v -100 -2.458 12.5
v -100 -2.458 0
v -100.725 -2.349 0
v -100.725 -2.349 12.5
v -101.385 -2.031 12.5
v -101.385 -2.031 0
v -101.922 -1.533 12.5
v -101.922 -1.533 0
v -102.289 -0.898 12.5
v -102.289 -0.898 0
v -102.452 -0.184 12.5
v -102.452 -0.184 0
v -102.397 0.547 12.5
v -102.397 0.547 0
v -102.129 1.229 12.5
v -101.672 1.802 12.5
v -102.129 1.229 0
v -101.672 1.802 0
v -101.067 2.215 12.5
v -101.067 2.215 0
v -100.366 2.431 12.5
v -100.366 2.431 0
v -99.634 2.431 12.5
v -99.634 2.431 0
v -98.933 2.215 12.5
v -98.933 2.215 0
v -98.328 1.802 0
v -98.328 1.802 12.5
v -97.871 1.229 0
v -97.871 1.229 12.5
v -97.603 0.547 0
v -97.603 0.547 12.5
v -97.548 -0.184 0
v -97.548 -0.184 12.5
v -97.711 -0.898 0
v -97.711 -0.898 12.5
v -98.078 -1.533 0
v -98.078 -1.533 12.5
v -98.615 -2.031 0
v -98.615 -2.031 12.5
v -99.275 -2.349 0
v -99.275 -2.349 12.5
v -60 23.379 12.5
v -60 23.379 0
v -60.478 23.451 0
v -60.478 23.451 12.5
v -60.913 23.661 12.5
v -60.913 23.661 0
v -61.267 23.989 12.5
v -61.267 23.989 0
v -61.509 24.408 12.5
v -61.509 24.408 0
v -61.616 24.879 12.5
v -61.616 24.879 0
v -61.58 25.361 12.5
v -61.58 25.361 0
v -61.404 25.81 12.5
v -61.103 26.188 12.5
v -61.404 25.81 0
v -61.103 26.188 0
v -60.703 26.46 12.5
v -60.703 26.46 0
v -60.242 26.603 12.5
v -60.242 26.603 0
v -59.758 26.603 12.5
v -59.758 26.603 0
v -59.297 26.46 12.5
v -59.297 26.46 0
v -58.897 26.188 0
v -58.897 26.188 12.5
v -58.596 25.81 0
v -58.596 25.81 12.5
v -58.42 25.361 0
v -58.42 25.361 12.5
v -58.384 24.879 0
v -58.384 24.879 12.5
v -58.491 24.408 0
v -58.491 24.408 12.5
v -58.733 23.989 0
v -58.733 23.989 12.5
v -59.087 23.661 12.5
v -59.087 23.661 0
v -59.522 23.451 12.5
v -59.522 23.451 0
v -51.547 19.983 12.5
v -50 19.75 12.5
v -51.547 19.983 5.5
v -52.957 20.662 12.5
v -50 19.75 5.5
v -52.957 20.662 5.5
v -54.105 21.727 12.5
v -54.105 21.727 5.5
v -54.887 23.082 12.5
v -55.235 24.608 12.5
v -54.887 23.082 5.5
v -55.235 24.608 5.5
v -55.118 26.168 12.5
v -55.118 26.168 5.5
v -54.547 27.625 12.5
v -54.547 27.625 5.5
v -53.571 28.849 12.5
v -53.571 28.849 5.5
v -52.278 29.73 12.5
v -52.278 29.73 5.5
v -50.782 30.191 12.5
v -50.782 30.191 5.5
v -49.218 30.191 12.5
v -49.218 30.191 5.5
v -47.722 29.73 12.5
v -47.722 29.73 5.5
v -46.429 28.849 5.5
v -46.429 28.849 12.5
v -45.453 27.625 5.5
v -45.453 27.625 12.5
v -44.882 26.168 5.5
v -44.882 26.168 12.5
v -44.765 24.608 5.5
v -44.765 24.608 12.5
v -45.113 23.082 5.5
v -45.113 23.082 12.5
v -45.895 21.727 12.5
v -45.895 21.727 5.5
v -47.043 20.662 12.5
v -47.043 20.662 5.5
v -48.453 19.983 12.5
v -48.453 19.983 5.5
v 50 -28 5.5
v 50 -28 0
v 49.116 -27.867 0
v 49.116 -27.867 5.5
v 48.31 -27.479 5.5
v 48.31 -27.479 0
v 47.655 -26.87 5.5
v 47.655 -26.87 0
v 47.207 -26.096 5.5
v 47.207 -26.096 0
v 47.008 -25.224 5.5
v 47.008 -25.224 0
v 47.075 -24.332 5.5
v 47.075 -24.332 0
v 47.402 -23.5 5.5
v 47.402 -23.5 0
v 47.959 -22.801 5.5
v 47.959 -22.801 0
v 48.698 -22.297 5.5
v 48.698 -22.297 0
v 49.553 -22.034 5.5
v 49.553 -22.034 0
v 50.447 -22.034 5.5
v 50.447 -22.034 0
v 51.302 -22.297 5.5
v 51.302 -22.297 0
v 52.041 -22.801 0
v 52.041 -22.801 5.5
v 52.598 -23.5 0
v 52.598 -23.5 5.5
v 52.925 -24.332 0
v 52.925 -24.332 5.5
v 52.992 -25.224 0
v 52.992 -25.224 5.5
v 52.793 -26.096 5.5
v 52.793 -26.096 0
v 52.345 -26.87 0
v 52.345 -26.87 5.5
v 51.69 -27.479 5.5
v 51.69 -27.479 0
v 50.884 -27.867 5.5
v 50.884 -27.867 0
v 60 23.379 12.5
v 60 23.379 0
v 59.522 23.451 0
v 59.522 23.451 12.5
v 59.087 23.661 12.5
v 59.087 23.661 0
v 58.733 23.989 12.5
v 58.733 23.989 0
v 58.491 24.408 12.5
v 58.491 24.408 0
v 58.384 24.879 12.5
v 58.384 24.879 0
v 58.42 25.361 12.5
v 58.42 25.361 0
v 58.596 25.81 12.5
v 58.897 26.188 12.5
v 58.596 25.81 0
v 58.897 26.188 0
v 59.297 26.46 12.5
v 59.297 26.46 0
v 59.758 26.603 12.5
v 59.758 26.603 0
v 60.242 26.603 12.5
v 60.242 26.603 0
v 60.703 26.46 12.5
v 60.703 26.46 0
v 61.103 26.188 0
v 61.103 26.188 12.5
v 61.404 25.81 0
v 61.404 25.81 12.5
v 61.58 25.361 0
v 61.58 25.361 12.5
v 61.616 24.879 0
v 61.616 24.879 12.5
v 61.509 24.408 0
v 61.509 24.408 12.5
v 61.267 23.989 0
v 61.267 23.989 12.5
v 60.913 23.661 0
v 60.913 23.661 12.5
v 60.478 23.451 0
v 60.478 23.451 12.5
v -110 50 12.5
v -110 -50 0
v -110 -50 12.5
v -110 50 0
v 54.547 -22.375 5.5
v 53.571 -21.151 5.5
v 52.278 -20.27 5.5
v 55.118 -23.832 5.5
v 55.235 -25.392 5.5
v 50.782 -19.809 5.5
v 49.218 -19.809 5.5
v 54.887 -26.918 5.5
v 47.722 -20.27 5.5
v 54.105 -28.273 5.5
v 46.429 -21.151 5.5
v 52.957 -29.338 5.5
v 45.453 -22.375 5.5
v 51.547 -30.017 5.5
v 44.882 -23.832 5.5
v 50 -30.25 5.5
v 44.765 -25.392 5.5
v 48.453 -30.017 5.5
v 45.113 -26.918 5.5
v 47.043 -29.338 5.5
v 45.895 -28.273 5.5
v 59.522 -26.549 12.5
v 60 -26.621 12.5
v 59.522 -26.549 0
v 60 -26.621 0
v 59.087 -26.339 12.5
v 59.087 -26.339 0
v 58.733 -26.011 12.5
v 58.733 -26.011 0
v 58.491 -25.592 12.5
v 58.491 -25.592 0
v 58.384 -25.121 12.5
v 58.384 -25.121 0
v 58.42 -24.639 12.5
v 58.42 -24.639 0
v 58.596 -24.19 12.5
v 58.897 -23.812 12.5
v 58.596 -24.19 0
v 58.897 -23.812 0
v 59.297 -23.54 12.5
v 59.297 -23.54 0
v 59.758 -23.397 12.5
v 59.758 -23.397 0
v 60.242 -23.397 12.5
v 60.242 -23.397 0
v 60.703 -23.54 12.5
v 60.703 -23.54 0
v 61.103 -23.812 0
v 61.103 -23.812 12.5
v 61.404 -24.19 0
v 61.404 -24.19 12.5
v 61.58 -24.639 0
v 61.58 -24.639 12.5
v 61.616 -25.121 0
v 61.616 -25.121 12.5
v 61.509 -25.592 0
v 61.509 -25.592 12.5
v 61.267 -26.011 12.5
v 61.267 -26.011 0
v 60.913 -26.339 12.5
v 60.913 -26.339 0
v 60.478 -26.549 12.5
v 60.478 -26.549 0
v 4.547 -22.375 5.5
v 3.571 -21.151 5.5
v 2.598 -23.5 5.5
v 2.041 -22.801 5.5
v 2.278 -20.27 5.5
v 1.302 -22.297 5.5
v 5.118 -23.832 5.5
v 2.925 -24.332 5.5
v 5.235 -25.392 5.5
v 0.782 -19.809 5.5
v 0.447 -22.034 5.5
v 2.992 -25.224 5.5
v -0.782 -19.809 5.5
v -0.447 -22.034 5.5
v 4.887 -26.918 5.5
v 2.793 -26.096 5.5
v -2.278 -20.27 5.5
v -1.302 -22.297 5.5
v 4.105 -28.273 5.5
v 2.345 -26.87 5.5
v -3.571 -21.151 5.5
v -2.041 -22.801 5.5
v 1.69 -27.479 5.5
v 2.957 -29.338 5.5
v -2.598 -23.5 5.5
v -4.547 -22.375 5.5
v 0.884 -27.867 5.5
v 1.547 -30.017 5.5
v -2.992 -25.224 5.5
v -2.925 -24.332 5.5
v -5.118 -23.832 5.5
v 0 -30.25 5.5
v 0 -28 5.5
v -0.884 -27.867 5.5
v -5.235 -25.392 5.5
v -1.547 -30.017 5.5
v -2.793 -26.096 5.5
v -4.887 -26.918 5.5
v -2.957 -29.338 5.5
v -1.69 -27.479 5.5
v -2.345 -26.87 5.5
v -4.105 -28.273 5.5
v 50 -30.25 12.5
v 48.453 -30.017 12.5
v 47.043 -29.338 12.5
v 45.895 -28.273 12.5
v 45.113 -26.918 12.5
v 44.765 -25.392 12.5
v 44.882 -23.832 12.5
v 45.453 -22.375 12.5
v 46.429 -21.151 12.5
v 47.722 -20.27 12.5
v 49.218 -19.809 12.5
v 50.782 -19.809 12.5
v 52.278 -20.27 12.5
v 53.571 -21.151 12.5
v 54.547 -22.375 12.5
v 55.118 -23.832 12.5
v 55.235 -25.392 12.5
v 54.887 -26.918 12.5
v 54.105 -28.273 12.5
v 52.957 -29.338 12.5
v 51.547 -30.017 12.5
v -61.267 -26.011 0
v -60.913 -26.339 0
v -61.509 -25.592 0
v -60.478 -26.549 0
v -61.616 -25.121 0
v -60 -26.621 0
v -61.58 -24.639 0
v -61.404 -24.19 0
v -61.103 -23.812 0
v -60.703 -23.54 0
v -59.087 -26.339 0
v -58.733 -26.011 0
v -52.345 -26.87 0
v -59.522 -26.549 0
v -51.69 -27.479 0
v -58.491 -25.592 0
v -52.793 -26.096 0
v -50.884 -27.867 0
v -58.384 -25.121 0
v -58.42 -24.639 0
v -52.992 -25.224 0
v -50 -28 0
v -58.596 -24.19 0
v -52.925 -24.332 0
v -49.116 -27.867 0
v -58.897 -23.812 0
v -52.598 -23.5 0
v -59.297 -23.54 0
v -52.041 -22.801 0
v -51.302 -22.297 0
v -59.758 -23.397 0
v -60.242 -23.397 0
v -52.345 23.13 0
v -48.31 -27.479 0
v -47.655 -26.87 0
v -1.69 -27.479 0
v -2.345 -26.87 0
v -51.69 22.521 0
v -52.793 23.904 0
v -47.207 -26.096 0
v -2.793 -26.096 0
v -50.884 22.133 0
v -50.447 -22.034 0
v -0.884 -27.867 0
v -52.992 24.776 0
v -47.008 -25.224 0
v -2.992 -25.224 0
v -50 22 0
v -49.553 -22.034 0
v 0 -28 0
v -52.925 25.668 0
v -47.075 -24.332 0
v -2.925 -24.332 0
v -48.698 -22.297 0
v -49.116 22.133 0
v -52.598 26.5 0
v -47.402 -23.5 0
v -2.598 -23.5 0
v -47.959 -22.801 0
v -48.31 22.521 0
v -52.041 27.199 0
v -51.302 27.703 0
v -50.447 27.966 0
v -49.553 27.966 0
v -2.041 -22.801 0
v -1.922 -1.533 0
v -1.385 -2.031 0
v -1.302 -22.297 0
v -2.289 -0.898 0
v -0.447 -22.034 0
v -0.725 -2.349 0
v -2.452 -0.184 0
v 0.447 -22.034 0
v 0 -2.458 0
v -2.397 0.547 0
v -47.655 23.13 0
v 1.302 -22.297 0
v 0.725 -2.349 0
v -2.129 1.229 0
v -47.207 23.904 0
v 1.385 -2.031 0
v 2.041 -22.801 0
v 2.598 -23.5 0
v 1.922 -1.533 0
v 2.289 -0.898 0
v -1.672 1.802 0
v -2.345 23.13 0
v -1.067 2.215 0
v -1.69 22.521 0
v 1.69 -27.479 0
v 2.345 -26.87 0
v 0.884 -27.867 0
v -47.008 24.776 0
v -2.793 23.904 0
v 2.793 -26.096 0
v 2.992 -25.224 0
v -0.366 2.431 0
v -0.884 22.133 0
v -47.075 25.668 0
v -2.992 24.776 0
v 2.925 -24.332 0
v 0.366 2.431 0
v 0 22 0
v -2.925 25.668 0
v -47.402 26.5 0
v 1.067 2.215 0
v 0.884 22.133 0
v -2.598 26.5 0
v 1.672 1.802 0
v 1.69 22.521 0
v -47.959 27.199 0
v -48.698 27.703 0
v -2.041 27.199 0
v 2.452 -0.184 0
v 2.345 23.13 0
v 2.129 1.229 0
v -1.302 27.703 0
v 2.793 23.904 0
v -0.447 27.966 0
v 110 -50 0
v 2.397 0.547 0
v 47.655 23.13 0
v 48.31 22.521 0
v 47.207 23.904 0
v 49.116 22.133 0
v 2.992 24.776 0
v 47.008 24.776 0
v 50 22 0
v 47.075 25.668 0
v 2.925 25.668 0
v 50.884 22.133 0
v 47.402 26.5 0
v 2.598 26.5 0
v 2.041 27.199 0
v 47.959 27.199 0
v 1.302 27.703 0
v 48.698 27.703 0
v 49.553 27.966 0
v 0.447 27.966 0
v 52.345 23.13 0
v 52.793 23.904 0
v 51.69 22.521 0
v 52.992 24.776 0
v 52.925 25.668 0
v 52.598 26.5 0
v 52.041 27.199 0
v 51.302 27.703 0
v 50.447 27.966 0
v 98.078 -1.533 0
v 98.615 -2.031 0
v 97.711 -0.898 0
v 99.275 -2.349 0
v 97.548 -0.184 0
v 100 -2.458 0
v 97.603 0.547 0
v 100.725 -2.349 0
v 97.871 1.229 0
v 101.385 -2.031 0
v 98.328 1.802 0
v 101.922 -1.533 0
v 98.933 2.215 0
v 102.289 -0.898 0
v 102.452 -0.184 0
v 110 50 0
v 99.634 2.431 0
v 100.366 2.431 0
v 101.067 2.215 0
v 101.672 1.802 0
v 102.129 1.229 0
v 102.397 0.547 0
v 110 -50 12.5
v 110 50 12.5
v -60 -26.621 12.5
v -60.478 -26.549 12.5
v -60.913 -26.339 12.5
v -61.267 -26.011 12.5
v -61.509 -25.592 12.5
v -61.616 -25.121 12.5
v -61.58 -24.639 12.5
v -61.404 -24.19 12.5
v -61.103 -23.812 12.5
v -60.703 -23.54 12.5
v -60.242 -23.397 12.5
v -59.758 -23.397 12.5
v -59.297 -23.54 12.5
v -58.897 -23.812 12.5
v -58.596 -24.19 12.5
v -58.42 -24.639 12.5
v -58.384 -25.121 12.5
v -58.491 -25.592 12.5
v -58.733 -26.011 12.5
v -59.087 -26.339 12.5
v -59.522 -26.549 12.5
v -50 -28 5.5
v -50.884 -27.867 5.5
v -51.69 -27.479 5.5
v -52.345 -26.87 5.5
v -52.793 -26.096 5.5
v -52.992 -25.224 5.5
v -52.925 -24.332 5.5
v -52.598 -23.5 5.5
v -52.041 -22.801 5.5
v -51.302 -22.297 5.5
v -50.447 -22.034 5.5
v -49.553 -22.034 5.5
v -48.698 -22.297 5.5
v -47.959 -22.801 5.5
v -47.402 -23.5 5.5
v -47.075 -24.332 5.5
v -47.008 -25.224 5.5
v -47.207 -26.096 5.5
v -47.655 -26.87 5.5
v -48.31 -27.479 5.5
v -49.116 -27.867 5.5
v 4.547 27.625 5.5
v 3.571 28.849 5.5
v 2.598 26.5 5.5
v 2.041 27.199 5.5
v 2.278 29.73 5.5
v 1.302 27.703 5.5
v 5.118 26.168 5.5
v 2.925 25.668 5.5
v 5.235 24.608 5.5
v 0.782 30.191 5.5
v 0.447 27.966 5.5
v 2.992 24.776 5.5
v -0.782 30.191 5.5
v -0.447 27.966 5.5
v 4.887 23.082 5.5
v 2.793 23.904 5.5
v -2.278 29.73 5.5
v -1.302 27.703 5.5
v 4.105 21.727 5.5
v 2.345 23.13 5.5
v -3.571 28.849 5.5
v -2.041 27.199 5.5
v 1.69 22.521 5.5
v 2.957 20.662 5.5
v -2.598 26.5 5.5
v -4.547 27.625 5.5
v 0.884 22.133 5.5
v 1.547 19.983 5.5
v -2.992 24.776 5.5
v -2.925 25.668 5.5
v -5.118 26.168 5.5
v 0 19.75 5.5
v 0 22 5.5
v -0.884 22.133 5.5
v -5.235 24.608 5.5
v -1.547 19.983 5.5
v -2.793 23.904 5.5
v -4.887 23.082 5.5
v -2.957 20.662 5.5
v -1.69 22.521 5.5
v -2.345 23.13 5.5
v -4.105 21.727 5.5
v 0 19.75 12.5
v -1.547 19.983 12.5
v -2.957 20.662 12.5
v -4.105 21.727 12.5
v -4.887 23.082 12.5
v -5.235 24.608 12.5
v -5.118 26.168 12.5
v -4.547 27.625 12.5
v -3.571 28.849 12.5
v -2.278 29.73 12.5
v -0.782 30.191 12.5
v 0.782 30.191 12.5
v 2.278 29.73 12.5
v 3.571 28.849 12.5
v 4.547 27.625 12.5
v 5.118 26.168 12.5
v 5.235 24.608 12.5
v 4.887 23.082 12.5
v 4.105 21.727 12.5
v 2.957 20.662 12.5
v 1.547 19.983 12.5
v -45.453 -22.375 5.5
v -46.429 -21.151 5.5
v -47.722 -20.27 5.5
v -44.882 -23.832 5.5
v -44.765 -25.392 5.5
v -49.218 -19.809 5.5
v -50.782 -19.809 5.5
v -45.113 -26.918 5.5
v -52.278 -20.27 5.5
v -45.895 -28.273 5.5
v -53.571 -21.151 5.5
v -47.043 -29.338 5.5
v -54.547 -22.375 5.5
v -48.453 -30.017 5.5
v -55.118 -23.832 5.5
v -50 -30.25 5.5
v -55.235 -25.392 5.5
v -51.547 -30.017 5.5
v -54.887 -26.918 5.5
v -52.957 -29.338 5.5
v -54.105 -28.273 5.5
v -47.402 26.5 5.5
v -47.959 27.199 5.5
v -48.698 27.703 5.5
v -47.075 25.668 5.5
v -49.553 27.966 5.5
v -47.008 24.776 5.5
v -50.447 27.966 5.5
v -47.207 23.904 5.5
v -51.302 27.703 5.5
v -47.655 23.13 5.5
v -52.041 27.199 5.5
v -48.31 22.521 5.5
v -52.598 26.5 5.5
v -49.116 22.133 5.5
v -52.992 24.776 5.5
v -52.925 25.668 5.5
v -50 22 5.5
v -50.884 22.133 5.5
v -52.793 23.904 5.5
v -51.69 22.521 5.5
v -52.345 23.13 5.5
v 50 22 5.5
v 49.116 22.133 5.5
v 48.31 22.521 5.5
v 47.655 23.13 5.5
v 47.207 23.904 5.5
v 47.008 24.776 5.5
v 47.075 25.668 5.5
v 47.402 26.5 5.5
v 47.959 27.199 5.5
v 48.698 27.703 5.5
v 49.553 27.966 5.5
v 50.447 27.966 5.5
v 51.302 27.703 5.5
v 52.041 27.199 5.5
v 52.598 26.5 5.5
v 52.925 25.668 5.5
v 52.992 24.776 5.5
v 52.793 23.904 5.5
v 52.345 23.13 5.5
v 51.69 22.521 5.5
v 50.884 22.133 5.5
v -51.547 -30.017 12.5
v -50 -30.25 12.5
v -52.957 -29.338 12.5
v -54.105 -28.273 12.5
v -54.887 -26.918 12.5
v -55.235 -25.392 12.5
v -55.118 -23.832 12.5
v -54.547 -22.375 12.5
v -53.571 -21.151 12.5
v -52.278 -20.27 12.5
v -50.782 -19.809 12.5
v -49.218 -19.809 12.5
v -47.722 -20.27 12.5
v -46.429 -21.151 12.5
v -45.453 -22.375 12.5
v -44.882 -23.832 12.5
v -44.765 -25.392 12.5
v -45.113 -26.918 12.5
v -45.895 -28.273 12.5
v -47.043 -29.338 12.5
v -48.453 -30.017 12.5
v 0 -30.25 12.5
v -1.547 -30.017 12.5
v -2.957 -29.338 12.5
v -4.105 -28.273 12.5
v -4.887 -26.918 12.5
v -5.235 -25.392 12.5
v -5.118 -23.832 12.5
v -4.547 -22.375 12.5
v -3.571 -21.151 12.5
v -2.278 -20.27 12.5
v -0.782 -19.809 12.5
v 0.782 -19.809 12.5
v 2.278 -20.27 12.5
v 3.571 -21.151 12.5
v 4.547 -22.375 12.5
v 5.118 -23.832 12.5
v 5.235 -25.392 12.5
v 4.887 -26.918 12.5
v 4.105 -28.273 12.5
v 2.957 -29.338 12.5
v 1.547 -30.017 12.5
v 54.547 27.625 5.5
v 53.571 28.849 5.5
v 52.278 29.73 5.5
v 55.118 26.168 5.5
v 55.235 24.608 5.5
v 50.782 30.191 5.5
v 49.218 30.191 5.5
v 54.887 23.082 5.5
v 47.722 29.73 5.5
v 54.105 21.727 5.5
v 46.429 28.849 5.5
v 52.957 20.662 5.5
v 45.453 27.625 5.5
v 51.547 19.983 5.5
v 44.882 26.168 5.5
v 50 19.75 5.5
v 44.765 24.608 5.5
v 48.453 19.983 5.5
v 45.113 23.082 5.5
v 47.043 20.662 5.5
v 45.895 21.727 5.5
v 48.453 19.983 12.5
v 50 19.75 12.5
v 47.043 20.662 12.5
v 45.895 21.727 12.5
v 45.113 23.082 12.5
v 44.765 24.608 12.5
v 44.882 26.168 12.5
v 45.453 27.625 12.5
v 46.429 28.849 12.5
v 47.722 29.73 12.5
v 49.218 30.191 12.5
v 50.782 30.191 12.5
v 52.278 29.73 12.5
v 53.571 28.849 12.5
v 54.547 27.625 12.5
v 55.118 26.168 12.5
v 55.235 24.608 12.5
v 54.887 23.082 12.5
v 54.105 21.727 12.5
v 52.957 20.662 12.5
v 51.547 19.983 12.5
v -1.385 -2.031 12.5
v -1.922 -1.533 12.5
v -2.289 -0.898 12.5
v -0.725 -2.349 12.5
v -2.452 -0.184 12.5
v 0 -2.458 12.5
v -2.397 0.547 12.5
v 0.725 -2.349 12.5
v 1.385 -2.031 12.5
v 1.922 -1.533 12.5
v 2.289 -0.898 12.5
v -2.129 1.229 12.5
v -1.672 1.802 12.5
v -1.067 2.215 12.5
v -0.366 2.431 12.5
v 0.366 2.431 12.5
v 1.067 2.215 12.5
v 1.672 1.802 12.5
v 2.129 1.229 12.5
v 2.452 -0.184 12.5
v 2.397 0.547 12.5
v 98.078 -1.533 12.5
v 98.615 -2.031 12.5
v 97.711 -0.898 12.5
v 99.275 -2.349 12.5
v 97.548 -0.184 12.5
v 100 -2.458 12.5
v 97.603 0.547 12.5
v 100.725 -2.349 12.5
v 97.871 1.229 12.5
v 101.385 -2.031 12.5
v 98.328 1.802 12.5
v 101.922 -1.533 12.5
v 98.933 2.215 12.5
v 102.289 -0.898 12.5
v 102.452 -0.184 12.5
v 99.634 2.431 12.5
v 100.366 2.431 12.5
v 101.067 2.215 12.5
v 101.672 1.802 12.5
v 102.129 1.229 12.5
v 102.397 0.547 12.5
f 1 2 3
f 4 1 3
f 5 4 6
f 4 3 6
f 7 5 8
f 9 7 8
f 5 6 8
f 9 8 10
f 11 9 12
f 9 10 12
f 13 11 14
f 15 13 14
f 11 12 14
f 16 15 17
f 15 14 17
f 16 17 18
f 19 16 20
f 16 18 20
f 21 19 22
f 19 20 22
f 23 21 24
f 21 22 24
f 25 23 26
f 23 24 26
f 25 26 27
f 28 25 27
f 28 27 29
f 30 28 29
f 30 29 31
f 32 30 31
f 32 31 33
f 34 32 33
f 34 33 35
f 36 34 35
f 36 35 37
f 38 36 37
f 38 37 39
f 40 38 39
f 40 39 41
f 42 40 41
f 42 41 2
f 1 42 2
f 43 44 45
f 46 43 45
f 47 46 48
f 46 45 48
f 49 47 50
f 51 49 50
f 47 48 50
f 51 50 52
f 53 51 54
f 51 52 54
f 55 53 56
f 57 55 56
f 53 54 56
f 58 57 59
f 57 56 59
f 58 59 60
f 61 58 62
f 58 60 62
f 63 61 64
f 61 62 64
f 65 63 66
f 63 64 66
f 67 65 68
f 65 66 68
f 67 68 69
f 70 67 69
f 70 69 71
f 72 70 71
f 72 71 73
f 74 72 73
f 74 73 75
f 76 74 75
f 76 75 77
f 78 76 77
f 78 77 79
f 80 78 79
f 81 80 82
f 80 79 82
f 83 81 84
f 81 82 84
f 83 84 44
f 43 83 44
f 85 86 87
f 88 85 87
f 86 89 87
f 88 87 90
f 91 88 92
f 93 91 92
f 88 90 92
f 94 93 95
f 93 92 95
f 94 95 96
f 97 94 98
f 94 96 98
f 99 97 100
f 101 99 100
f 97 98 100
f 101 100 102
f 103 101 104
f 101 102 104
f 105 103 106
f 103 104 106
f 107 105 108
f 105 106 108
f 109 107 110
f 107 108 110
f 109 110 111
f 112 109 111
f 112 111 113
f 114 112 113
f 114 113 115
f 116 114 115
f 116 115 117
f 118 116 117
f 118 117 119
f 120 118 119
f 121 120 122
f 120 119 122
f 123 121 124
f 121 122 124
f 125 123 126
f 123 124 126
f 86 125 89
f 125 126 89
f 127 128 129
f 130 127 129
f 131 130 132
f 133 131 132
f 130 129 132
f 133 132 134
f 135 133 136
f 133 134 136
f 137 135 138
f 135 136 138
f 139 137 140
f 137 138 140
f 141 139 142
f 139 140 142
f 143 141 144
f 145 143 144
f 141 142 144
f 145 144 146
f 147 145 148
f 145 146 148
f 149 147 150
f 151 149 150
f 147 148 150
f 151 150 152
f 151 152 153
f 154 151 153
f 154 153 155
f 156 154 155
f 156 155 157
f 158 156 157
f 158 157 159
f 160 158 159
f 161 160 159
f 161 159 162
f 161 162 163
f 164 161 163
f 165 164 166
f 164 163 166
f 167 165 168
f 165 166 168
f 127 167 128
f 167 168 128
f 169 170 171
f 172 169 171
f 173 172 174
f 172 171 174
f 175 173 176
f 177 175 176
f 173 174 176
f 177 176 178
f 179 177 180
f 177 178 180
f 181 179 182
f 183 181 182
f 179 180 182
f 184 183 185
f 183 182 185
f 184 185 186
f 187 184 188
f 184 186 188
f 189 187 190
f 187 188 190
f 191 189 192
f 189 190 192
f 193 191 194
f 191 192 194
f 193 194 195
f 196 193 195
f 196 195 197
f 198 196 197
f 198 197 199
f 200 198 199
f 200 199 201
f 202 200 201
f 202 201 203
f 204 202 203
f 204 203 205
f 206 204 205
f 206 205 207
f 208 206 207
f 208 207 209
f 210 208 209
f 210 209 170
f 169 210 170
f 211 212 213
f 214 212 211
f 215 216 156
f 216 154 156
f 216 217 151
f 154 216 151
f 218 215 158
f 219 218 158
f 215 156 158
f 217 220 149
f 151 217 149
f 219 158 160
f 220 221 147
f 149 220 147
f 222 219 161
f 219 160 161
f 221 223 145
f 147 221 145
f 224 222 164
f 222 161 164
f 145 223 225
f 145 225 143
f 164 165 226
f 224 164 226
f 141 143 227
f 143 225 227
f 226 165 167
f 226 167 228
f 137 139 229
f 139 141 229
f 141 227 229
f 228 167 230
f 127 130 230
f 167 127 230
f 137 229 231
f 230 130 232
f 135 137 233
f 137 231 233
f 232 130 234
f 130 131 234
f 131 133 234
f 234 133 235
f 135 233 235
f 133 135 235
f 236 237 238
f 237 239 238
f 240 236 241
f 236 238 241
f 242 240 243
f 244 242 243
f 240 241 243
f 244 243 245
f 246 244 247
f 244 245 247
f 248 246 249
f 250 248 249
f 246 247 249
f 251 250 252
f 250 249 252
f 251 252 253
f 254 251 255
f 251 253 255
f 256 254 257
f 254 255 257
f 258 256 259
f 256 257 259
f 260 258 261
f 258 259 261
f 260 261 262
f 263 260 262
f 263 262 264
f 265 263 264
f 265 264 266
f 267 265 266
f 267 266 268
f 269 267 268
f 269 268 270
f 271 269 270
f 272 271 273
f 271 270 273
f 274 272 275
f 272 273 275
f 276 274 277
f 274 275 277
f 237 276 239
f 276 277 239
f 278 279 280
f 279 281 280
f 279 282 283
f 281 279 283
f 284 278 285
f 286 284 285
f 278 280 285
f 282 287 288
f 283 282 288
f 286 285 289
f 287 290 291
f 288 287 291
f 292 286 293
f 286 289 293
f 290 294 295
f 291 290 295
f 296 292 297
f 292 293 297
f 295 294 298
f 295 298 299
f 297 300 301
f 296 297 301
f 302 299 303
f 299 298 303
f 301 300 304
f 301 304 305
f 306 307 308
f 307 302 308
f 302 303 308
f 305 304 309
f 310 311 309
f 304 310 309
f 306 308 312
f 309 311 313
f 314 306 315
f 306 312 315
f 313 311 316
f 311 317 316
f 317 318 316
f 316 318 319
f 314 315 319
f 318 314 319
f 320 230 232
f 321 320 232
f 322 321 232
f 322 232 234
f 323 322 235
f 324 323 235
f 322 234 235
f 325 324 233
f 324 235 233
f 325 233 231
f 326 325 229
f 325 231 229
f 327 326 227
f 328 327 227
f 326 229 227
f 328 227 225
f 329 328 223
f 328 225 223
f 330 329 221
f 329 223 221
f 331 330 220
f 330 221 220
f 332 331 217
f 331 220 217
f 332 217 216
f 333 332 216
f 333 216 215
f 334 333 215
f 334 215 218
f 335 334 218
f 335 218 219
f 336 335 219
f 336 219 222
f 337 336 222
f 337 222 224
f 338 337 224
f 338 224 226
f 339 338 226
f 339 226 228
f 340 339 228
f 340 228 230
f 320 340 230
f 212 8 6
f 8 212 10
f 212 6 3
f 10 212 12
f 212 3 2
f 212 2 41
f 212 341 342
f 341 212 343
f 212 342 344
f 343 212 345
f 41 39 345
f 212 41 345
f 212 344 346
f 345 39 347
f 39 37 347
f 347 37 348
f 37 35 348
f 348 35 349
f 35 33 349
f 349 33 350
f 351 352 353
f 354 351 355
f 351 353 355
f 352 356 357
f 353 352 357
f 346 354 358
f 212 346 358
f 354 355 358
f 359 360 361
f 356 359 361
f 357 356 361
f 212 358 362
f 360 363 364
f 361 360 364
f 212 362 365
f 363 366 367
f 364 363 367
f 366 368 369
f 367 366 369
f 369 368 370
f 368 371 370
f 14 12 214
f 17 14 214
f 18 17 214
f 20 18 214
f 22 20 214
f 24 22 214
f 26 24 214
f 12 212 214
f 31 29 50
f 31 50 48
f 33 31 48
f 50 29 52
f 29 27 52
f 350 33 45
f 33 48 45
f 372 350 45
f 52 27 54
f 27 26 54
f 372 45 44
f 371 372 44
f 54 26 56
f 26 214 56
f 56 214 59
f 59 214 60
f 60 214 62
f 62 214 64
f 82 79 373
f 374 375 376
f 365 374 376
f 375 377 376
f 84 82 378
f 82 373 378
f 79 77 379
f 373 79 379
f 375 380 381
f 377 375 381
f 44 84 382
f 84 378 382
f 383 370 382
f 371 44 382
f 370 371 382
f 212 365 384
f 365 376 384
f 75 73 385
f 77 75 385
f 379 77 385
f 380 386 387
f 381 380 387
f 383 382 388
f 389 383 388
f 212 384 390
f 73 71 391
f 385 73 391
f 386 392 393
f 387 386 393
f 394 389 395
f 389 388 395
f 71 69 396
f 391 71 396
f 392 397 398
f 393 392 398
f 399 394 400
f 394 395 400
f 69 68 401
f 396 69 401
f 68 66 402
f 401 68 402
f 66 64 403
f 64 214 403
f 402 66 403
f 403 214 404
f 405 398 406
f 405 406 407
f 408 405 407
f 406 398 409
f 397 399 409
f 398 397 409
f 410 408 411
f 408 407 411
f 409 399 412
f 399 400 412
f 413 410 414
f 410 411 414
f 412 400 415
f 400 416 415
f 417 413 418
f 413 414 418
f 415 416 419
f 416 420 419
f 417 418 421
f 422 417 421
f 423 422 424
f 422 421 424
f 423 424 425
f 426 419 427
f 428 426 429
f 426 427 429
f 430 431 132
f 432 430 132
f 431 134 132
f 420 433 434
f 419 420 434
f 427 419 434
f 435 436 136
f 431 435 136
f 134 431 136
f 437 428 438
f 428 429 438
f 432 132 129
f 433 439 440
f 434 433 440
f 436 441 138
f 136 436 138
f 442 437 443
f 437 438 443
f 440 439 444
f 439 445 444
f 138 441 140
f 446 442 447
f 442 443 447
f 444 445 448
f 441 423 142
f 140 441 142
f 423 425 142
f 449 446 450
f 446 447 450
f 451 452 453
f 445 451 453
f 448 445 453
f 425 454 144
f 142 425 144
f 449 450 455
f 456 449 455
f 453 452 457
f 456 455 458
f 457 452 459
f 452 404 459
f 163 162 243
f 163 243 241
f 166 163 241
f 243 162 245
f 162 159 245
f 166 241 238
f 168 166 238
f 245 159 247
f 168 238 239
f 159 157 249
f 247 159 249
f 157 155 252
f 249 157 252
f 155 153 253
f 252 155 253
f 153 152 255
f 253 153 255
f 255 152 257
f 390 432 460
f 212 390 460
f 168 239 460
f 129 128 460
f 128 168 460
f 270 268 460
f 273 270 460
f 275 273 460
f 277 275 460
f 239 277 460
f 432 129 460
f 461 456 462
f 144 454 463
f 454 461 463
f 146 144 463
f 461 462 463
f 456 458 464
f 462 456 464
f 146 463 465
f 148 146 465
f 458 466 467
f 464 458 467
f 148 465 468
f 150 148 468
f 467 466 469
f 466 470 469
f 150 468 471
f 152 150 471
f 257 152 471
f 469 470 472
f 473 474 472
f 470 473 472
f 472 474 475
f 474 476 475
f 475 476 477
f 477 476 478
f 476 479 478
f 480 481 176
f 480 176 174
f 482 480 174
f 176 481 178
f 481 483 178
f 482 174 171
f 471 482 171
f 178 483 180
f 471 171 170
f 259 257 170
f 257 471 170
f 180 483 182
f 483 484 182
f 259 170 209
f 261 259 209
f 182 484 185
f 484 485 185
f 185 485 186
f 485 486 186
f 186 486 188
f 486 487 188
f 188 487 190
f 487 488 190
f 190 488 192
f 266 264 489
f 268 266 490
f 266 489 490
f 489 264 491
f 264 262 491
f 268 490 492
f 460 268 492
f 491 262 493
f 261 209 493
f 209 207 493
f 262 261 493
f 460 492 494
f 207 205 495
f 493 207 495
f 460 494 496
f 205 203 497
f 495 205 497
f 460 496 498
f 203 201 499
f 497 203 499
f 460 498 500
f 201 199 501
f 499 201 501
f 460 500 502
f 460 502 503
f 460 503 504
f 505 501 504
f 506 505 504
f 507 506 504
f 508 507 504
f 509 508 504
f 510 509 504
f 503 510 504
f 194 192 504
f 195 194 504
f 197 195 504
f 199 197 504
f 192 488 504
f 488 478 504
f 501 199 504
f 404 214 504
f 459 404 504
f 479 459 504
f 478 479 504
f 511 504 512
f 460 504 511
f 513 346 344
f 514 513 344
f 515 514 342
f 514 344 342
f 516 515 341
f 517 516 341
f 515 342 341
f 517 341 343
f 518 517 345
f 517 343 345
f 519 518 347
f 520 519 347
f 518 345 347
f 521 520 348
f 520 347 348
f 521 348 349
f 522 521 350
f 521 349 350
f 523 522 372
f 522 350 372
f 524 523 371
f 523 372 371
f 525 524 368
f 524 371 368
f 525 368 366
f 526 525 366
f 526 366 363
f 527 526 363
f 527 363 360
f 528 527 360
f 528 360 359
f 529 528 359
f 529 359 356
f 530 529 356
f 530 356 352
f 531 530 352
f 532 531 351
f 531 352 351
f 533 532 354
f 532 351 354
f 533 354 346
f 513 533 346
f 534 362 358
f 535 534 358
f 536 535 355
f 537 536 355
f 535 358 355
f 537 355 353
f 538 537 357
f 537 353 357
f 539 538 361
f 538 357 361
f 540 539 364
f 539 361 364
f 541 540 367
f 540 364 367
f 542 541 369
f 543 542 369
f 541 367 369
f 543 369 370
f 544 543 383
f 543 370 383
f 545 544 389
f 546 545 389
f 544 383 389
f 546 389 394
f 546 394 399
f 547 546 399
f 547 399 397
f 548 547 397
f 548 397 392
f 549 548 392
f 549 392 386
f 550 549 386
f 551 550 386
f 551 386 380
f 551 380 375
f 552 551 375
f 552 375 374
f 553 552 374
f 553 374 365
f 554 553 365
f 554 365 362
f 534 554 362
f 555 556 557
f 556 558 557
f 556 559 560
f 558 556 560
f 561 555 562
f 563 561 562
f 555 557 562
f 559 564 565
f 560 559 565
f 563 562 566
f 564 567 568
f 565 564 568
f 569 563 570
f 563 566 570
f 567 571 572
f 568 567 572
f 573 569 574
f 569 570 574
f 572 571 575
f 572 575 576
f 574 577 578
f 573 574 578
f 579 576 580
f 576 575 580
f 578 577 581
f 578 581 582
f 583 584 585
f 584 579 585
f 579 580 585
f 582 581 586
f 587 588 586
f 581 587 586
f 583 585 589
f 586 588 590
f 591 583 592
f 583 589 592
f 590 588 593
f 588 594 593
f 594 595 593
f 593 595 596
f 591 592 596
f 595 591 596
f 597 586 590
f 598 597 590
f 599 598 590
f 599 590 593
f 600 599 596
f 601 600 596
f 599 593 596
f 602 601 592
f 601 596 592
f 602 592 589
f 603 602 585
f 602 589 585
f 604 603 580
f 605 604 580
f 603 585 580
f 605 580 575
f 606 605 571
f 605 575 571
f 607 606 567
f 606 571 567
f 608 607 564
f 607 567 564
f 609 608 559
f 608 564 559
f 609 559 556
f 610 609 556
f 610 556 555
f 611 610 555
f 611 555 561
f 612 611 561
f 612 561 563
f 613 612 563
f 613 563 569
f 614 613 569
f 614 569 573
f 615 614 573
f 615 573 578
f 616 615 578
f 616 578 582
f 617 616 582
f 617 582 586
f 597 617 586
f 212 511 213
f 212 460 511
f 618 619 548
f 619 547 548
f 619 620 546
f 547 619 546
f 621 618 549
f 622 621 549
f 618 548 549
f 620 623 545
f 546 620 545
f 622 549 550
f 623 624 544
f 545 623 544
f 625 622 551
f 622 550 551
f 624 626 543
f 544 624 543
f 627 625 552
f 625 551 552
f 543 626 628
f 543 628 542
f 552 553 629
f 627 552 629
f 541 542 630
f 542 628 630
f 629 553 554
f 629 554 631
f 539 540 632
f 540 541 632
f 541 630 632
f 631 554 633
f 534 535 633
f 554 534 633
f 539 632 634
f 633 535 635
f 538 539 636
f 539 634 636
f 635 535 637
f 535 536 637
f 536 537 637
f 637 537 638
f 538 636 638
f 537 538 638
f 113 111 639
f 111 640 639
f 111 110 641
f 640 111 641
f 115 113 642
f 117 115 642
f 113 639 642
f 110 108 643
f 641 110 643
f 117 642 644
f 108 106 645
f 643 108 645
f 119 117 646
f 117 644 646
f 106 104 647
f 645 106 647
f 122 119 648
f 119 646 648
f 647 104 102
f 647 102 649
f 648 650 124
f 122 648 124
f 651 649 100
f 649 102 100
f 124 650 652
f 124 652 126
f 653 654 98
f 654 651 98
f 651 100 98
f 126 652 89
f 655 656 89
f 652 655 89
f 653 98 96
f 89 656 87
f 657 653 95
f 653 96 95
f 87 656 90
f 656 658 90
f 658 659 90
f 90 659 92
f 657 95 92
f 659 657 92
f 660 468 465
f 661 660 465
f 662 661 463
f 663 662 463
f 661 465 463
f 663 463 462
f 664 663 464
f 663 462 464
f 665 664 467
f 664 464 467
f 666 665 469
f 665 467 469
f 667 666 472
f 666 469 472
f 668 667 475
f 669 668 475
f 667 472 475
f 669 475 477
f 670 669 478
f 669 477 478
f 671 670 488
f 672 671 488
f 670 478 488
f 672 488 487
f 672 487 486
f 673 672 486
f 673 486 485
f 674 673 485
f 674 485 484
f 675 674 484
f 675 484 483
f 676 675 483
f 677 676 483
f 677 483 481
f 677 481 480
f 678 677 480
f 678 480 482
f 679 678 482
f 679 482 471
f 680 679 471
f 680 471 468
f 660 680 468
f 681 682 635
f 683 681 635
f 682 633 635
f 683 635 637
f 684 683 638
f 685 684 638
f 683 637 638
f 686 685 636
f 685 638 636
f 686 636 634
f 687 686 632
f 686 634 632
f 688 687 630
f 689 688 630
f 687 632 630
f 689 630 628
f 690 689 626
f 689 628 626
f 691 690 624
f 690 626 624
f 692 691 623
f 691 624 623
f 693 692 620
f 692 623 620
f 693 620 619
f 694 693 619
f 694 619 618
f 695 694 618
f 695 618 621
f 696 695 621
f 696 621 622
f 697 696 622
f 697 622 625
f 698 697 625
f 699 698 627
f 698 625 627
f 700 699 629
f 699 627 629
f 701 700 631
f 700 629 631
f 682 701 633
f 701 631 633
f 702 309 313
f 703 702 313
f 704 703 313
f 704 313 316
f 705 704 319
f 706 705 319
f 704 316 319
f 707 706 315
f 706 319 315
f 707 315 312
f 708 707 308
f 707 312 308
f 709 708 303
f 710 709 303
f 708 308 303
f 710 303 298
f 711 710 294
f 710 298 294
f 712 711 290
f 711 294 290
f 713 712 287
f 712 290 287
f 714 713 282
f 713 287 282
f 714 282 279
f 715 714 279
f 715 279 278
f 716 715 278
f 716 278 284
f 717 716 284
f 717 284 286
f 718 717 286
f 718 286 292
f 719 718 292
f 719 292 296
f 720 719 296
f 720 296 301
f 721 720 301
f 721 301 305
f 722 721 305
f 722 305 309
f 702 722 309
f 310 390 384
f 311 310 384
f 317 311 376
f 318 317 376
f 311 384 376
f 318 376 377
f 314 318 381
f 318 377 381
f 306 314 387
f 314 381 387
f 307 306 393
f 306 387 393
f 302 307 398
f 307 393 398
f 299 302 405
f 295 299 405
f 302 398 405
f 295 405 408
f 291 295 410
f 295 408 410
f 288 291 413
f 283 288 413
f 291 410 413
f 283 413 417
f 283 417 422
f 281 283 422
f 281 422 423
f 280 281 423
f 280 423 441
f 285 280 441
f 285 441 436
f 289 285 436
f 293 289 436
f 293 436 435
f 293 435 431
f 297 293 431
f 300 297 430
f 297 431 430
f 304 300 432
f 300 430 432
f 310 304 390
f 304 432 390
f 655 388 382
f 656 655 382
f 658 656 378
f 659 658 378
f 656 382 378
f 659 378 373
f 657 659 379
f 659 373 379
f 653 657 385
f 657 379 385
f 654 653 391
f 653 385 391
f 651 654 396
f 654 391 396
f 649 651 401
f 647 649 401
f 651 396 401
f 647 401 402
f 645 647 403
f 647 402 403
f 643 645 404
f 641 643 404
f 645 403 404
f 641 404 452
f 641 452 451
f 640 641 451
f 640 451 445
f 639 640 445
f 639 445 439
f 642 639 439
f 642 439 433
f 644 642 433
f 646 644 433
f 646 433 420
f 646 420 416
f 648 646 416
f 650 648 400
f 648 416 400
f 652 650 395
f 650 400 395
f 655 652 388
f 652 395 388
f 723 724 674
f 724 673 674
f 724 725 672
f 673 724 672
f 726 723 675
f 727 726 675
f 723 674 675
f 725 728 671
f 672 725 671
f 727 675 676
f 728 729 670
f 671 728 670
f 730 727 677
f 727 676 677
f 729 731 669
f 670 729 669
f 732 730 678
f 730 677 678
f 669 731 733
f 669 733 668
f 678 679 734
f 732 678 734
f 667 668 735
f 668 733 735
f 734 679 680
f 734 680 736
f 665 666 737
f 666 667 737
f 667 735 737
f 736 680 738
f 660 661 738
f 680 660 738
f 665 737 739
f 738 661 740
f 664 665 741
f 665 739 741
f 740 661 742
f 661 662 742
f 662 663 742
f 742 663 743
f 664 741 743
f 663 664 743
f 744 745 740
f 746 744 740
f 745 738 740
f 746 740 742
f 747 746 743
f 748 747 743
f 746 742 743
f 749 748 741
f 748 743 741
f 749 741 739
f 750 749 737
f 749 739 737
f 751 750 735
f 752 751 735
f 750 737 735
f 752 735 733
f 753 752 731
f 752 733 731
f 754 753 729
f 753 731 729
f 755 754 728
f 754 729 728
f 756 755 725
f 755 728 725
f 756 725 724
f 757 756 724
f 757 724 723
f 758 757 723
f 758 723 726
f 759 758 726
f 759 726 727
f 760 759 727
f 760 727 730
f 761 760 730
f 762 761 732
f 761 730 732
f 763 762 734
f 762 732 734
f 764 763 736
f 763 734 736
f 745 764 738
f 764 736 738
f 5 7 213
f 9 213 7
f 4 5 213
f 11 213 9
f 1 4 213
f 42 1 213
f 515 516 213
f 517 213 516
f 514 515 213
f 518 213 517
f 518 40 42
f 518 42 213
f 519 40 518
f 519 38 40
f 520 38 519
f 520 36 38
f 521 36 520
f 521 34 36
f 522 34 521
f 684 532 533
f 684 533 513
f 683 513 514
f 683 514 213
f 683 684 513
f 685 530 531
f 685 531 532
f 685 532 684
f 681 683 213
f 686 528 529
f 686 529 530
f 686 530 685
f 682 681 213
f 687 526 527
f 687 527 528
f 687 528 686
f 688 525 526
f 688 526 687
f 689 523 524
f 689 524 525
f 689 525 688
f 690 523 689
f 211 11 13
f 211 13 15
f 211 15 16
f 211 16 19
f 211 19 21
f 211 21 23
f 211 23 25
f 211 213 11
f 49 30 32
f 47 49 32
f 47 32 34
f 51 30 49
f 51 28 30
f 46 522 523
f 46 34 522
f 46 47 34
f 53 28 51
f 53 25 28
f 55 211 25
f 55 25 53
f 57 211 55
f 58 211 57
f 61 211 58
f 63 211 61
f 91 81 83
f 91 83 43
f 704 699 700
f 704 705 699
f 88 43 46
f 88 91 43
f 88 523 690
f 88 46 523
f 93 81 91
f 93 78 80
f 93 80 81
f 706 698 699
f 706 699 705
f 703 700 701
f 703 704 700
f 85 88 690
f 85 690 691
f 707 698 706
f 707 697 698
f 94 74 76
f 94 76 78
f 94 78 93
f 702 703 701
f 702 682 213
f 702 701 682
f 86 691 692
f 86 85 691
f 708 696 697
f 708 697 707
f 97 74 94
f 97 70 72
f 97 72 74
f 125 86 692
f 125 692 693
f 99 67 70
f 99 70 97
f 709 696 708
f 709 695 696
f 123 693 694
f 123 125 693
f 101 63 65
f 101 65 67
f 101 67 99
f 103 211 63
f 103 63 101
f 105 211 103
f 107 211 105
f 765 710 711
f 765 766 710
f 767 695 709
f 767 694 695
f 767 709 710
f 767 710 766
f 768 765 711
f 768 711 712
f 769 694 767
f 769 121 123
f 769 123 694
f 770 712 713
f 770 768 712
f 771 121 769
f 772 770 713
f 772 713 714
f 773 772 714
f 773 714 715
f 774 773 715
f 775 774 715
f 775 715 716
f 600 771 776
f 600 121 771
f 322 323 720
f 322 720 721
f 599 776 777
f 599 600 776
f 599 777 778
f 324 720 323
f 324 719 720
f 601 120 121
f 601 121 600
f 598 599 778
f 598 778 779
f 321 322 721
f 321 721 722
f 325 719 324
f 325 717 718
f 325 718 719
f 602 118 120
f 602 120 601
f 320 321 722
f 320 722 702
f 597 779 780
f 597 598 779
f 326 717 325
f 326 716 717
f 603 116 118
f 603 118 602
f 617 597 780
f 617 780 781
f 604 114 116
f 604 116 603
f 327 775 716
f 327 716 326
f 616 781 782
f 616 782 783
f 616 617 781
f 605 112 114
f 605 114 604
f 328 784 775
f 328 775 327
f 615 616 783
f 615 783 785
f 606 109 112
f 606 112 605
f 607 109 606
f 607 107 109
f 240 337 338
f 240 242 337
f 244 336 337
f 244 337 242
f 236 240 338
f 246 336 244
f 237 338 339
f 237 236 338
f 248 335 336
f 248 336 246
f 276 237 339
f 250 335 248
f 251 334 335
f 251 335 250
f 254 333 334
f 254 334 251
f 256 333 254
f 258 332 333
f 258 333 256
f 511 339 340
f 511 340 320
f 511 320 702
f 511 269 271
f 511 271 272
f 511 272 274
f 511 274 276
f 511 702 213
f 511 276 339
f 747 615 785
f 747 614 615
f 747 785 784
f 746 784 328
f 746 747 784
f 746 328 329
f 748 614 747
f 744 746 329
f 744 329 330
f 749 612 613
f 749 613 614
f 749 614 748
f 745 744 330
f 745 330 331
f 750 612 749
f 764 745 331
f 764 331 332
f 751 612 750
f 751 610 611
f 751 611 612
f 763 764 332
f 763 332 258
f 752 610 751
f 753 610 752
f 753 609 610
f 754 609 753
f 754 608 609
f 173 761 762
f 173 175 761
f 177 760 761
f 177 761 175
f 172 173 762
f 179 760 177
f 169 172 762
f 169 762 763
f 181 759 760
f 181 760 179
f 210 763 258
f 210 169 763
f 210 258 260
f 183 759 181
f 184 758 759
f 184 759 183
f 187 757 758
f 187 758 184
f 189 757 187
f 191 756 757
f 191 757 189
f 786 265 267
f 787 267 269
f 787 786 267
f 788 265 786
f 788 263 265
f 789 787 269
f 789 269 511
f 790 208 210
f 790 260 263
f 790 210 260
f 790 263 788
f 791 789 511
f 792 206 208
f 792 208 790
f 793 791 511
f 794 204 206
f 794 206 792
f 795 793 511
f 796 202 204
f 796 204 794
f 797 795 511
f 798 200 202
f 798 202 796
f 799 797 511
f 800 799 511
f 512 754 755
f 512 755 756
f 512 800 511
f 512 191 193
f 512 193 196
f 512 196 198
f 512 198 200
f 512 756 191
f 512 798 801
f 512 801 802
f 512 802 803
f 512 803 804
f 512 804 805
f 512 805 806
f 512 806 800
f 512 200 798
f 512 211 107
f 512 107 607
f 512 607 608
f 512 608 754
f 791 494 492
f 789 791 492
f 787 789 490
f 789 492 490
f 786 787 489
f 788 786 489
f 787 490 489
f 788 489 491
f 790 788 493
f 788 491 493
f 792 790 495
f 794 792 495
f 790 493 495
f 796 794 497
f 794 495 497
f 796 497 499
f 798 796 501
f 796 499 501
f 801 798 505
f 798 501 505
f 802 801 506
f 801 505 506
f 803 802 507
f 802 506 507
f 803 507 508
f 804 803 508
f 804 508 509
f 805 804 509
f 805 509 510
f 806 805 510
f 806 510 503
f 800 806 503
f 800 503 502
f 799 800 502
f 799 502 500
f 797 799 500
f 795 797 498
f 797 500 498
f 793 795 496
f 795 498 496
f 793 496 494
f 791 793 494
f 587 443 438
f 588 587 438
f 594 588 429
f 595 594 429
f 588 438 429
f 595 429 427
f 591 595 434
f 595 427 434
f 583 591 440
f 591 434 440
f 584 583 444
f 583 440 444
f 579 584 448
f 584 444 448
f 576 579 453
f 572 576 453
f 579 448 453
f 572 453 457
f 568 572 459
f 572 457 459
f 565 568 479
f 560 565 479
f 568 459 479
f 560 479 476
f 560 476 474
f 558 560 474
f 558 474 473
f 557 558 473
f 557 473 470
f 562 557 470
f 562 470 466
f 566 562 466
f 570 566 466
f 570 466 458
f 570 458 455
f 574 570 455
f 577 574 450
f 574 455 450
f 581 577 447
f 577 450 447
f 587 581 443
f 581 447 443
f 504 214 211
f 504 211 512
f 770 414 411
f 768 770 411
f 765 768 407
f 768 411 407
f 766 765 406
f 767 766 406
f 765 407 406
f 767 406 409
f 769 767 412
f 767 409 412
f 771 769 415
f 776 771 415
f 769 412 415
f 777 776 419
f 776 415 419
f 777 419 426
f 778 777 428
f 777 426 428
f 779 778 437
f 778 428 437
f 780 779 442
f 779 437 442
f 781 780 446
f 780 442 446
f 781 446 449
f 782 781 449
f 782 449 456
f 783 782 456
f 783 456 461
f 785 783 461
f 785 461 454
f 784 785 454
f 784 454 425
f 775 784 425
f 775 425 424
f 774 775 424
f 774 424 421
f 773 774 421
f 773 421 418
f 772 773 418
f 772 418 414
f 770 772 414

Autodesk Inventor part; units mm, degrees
ref_plane "YZ Plane" through (0, 0, 0) normal (1, 0, 0) x (0, 1, 0)
ref_plane "XZ Plane" through (0, 0, 0) normal (0, 1, 0) x (-1, 0, 0)
ref_plane "XY Plane" through (0, 0, 0) normal (0, 0, 1) x (1, 0, 0)
sketch "Sketch1" plane through (0, 0, 0) normal (0, 0, 1) x (1, 0, 0)
  line L0 (0, 70) -> (0, -70) construction
  line L1 (-154, 0) -> (154, 0) construction
  line L2 (-110, 50) -> (110, 50)
  line L3 (110, 50) -> (110, -50)
  line L4 (110, -50) -> (-110, -50)
  line L5 (-110, -50) -> (-110, 50)
  point P0 (0, 0)
  dimension "d0" = 100
  dimension "d1" = 220
  dimension "d2" = 110
extrude "Extrusion1" add sketch "Sketch1" along normal blind 12.5
sketch "Sketch2" plane through (0, 0, 12.5) normal (0, 0, 1) x (1, 0, 0)
  line L0 (110, 50) -> (-110, 50) construction
  line L1 (-110, 50) -> (-110, -50) construction
  line L2 (-110, -50) -> (110, -50) construction
  line L3 (110, -50) -> (110, 50) construction
  line L4 (-60, 25) -> (60, 25) construction
  line L5 (60, 25) -> (60, -25) construction
  line L6 (60, -25) -> (-60, -25) construction
  line L7 (-60, -25) -> (-60, 25) construction
  line L8 (0, 70) -> (0, -70) construction
  line L9 (-154, 0) -> (154, 0) construction
  point P0 (0, 0)
  dimension "d5" = 50
  dimension "d6" = 120
hole "Hole1" at (-60, 25, 12.5) at (-60, -25, 12.5) at (60, -25, 12.5) at (60, 25, 12.5) direction (0, 0, -1) diameter 3.242 end through all thread size "M4x0.7" class "6H" standard "ANSI Metric M Profile"
sketch "Sketch3" plane through (0, 0, 12.5) normal (0, 0, 1) x (1, 0, 0)
  circle A0 centre (60, -25) radius 1.621 construction
  circle A1 centre (-60, 25) radius 1.621 construction
  circle A2 centre (-60, -25) radius 1.621 construction
  circle A3 centre (60, 25) radius 1.621 construction
  line L0 (110, 50) -> (-110, 50) construction
  line L1 (-110, 50) -> (-110, -50) construction
  line L2 (-110, -50) -> (110, -50) construction
  line L3 (110, -50) -> (110, 50) construction
  line L4 (0, 70) -> (0, -70) construction
  line L5 (-154, 0) -> (154, 0) construction
  point P0 (0, 0)
  point P1 (-100, 0)
  point P2 (100, 0)
  dimension "d14" = 100
  dimension "d39" = 100
hole "Hole2" at (-100, 0, 12.5) at (100, 0, 12.5) at (0, 0, 12.5) direction (0, 0, -1) diameter 4.917 end through all thread size "M6x1" class "6H" standard "ANSI Metric M Profile"
sketch "Sketch4" plane through (0, 0, 12.5) normal (0, 0, 1) x (1, 0, 0)
  circle A0 centre (-100, 0) radius 2.4585 construction
  circle A1 centre (60, -25) radius 1.621 construction
  circle A2 centre (-60, 25) radius 1.621 construction
  circle A3 centre (-60, -25) radius 1.621 construction
  circle A4 centre (60, 25) radius 1.621 construction
  line L0 (110, 50) -> (-110, 50) construction
  line L1 (-110, 50) -> (-110, -50) construction
  line L2 (-110, -50) -> (110, -50) construction
  line L3 (110, -50) -> (110, 50) construction
  line L4 (0, 70) -> (0, -70) construction
  line L5 (-154, 0) -> (154, 0) construction
  point P0 (0, 0)
  point P1 (-50, 25)
  point P2 (0, 25)
  point P3 (50, 25)
  point P4 (-50, -25)
  point P5 (0, -25)
  point P6 (50, -25)
  dimension "d22" = 50
  dimension "d23" = 25
  dimension "d26" = 50
  dimension "d29" = 50
hole "Hole3" at (-50, 25, 12.5) at (0, 25, 12.5) at (50, 25, 12.5) at (-50, -25, 12.5) at (0, -25, 12.5) at (50, -25, 12.5) direction (0, 0, -1) diameter 6 end through all counterbore diameter 10.5 counterbore depth 7
properties part number "X95carrier-to-M605-adapter-V1"
